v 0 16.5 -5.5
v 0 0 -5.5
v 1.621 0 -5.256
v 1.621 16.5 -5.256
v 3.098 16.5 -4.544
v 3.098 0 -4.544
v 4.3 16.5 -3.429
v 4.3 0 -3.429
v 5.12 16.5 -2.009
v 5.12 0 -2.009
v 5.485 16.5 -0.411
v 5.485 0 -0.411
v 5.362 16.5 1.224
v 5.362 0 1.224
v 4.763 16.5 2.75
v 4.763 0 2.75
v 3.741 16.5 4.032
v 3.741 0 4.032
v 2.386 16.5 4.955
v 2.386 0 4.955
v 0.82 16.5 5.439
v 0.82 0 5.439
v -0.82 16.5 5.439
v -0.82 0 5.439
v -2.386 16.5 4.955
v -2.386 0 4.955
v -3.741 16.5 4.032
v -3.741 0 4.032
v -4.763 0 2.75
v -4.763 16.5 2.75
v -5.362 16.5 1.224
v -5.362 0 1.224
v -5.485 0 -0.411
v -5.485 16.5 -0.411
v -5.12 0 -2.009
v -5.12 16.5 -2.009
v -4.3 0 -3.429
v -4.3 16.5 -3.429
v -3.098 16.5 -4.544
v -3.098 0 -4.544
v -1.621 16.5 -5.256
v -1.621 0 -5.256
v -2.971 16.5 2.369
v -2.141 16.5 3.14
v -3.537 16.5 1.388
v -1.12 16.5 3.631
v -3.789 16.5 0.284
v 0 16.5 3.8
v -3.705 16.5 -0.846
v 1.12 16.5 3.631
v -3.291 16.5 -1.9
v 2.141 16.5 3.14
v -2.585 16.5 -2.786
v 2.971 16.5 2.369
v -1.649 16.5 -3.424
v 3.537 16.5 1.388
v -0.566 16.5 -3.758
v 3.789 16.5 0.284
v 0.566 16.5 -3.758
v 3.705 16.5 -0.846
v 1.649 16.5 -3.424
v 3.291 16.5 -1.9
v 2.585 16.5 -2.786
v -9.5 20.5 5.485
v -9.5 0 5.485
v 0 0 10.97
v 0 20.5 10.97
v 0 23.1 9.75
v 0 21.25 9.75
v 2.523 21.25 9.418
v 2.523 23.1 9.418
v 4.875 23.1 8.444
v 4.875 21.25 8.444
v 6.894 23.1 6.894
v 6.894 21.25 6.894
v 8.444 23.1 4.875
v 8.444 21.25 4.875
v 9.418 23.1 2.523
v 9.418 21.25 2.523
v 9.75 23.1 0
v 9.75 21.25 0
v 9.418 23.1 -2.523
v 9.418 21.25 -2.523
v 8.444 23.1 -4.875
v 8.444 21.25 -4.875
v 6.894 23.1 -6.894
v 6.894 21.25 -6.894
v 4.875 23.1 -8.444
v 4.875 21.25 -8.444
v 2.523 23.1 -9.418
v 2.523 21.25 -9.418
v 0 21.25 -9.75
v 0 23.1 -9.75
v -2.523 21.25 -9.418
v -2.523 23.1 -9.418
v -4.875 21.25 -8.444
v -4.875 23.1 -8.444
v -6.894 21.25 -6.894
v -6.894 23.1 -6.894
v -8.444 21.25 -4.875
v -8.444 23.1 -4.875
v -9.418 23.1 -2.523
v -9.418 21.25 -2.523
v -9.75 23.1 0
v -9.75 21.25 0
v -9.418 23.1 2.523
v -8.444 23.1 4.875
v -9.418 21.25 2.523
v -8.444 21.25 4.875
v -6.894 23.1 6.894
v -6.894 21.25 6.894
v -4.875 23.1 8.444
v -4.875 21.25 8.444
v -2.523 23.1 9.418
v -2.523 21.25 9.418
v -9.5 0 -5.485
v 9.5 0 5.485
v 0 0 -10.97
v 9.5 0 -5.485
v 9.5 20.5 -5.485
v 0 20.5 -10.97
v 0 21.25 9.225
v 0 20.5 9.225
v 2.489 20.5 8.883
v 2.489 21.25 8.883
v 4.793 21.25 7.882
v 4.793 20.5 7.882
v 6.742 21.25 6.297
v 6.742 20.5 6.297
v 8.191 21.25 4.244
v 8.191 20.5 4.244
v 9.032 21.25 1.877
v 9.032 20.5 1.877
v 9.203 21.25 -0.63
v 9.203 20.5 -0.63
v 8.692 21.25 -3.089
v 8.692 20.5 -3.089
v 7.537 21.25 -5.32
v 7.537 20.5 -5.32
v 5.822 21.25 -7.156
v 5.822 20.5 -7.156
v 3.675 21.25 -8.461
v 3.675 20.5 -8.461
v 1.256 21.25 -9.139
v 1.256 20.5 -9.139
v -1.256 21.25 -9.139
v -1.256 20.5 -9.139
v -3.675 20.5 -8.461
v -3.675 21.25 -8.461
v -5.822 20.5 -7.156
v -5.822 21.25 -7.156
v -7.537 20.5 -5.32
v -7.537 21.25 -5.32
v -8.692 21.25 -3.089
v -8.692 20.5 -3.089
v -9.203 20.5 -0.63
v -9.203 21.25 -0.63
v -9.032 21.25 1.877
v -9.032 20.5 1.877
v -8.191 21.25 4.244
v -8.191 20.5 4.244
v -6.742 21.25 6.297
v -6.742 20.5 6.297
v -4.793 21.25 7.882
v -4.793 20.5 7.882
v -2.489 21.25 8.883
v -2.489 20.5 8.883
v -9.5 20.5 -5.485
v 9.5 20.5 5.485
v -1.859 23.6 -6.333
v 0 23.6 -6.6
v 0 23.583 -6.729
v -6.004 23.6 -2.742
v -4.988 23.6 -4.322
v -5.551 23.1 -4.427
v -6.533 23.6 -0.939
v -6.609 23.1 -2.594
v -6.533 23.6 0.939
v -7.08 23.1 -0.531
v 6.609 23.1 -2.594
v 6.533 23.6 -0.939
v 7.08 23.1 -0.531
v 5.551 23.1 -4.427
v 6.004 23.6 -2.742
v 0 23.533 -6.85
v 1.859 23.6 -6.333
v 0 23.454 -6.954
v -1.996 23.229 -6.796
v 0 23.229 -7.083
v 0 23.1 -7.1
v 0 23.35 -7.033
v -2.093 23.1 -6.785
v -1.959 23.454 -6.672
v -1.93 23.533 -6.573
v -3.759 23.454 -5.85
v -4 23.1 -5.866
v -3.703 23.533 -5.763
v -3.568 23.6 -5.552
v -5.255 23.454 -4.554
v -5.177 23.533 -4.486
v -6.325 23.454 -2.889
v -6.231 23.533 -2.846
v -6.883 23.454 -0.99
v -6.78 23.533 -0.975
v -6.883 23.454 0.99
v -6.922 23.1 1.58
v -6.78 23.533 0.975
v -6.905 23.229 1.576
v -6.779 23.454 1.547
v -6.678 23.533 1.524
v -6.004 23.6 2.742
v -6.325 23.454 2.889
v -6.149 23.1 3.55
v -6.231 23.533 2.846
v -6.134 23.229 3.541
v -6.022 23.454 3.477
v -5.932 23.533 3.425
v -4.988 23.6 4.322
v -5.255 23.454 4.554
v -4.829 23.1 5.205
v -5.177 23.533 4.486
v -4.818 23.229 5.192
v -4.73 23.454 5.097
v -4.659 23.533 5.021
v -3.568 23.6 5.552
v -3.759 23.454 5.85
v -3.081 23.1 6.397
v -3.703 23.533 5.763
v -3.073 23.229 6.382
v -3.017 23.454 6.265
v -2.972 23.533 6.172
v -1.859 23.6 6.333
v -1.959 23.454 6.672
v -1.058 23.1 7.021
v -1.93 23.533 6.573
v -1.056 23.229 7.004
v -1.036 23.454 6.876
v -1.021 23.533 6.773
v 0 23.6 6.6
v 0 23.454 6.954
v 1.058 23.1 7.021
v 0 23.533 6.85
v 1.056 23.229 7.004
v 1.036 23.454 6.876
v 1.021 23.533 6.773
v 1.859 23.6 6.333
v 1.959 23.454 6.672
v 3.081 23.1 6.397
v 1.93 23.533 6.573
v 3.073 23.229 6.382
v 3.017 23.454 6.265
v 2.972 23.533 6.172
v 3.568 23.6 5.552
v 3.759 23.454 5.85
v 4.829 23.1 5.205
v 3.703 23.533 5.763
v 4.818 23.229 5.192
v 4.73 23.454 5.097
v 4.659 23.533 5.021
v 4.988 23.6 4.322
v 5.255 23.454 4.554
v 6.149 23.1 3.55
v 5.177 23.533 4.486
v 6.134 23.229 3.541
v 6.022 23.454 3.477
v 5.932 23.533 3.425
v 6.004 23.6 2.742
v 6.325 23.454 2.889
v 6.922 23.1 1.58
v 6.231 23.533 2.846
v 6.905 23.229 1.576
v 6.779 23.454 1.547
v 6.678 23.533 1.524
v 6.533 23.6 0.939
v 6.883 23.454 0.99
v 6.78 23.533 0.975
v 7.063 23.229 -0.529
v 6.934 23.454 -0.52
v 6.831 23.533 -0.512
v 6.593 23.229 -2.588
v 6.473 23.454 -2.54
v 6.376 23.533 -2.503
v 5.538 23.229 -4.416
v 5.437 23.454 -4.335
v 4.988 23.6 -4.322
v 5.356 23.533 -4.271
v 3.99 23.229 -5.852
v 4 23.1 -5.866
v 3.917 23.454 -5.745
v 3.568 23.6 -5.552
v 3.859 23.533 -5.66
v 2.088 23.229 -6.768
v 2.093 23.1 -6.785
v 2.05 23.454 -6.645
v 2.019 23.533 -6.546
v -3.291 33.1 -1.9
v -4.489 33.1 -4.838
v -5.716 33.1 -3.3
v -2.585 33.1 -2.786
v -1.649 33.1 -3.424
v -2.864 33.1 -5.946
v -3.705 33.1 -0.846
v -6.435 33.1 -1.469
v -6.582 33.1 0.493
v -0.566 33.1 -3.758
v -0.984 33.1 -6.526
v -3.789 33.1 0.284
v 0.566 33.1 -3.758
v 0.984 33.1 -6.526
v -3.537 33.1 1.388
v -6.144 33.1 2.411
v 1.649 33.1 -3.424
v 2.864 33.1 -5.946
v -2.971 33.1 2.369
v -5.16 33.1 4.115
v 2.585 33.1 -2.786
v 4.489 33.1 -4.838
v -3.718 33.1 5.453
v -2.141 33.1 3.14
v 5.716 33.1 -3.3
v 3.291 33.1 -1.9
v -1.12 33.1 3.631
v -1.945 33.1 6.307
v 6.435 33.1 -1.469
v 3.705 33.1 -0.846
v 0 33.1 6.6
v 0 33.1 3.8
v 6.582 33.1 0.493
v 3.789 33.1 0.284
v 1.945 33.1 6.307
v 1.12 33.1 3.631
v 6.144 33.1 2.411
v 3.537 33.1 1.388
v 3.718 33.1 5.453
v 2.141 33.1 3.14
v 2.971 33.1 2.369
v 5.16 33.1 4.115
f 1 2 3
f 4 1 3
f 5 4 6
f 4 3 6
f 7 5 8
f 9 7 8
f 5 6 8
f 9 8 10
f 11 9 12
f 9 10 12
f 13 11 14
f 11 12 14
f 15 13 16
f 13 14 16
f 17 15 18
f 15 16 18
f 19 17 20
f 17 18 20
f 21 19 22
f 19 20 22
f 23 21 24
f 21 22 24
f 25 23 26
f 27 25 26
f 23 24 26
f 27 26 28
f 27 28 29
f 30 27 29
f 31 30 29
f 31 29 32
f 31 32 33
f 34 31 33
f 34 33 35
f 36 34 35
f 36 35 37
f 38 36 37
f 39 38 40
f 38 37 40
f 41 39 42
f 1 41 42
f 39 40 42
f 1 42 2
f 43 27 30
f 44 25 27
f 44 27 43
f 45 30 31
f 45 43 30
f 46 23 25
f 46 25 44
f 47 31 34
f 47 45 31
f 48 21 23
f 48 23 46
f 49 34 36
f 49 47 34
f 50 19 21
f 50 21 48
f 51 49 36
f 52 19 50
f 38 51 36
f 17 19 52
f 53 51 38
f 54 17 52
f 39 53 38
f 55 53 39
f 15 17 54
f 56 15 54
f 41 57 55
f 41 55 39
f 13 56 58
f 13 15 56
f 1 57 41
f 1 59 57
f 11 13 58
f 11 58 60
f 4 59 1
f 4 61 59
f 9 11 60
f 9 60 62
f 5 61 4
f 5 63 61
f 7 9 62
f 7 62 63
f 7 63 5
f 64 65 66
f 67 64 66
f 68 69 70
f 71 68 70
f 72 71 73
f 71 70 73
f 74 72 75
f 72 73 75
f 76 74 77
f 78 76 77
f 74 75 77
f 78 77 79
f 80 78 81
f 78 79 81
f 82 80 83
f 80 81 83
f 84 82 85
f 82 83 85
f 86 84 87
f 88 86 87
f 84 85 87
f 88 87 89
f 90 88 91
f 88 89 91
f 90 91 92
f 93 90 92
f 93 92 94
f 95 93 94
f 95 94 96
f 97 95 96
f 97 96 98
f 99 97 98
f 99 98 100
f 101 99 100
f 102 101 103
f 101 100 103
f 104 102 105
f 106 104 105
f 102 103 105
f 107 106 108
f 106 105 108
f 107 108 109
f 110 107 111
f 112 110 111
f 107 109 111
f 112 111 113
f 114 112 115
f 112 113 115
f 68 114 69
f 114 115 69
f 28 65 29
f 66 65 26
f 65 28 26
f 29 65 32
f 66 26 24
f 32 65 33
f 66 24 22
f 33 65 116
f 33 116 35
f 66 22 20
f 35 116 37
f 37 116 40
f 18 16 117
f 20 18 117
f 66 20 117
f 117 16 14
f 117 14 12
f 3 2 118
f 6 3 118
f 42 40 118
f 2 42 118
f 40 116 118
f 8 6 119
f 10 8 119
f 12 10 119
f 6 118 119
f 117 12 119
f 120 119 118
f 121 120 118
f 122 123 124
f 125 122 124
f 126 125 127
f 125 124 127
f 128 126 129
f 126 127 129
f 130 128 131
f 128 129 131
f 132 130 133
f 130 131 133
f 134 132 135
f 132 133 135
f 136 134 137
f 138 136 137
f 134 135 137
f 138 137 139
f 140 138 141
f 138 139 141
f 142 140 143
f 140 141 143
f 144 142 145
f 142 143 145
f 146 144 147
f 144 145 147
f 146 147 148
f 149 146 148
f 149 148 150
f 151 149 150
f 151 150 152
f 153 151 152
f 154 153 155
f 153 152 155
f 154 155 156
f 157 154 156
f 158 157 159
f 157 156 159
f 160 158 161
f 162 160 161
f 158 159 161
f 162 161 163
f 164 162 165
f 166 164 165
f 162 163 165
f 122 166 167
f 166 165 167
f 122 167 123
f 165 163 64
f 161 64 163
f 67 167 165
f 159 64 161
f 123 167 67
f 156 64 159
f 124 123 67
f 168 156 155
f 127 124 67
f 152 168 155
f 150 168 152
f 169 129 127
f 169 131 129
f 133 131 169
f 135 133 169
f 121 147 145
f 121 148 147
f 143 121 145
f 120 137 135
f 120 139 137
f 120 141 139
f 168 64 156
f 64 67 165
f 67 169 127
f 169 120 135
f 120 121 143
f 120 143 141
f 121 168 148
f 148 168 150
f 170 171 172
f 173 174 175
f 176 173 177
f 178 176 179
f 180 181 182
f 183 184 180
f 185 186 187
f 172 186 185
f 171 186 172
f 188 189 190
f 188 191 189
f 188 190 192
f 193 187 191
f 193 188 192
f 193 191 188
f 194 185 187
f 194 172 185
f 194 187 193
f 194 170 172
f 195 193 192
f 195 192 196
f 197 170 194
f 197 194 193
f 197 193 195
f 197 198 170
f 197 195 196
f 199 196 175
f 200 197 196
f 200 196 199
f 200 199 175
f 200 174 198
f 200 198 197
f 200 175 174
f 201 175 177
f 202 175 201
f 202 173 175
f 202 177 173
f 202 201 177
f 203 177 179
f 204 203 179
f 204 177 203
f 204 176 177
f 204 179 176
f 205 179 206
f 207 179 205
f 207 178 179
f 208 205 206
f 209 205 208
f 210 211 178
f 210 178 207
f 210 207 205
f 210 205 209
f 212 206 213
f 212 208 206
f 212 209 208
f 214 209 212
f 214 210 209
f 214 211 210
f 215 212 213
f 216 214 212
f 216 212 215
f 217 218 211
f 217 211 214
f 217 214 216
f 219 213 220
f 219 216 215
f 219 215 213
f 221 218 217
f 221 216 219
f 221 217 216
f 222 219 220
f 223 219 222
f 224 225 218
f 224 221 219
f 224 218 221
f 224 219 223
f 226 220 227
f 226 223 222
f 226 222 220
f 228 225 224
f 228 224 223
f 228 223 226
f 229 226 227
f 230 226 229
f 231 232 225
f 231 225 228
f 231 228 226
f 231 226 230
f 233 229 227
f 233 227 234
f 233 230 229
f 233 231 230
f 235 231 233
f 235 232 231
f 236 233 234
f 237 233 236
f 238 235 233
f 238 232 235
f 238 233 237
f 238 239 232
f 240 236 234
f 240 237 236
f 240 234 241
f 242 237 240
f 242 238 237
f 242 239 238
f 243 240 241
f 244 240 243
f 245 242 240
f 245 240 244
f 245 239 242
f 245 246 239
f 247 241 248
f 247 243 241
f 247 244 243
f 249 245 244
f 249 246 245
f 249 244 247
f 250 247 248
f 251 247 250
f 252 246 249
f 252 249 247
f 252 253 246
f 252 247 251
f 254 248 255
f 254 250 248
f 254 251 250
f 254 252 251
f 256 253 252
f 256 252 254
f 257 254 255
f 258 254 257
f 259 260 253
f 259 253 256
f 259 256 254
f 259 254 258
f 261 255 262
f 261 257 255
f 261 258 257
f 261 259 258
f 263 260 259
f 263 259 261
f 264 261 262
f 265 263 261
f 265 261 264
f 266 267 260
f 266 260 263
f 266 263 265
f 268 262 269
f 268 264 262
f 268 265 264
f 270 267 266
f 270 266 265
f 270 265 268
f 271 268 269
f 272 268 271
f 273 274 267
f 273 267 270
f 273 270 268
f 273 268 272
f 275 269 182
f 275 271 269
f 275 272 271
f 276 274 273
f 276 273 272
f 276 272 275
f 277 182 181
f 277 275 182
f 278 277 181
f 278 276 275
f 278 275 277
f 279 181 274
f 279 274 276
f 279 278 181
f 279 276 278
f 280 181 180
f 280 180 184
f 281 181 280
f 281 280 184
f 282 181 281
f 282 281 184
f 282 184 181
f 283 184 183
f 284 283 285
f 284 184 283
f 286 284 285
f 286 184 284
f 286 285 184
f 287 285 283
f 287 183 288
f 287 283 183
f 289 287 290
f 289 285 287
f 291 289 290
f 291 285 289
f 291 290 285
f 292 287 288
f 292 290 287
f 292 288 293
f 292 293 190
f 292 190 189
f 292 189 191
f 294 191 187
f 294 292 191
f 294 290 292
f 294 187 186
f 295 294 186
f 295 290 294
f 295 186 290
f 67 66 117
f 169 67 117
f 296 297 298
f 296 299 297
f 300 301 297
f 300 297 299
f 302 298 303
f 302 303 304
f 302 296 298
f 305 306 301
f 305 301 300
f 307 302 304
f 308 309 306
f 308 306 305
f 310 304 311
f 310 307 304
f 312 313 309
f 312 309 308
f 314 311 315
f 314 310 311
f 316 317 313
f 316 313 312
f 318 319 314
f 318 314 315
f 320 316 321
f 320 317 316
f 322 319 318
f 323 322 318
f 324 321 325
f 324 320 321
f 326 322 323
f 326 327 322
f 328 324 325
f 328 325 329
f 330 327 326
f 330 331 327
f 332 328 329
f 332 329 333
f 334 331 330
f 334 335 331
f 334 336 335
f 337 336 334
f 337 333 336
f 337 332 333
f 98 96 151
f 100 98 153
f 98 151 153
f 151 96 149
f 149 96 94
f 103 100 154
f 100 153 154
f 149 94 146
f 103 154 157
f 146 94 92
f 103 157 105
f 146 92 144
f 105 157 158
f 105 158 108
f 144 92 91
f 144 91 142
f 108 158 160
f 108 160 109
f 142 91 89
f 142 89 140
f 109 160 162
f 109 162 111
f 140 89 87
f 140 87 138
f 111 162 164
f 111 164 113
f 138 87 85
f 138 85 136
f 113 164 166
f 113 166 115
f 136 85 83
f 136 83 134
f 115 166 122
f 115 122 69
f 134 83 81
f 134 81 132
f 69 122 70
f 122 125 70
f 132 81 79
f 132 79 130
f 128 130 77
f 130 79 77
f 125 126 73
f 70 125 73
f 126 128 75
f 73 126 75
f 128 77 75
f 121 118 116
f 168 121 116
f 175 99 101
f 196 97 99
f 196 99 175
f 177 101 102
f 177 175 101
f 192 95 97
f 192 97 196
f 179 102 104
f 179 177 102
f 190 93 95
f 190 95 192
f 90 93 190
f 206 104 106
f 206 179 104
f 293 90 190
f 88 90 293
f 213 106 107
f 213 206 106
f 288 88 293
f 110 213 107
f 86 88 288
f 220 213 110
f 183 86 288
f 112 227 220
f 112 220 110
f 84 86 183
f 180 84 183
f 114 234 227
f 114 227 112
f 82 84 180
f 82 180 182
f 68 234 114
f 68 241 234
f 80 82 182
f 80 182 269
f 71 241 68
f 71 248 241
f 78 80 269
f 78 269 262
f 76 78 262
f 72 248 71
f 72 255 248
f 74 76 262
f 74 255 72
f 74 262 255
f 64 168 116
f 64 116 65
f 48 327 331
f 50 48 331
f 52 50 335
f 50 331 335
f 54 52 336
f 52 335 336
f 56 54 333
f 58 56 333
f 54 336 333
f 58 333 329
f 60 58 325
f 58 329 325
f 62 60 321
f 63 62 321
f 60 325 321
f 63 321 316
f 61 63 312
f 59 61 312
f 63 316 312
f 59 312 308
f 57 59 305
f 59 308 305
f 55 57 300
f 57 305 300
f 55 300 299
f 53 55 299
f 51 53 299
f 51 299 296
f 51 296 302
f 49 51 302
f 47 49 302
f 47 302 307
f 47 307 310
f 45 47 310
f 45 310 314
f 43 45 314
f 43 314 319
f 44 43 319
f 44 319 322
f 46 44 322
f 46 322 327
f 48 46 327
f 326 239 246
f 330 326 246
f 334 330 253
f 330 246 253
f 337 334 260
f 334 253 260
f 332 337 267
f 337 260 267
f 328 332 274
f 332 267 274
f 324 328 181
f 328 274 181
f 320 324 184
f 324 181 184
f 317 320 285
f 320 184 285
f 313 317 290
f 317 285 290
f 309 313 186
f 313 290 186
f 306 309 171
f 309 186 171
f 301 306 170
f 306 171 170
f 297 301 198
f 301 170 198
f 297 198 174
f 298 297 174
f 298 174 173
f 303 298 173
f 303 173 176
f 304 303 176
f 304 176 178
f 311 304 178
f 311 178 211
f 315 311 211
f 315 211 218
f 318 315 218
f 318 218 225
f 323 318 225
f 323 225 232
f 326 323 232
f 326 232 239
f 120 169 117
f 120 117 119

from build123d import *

# Parameters (mm, degrees)
BOSS_EXTRUDE1_DEPTH = 20.5
SKETCH2_R           = 9.225
BOSS_EXTRUDE2_DEPTH = 0.75
SKETCH3_R           = 9.75
BOSS_EXTRUDE3_DEPTH = 1.85
SKETCH4_R           = 6.6
BOSS_EXTRUDE4_DEPTH = 10
SKETCH5_R           = 3.8
CUT_EXTRUDE1_DEPTH  = 37.207814534
SKETCH6_R           = 5.5
CUT_EXTRUDE2_DEPTH  = 16.5


with BuildPart() as part:
    # Sketch1 → Boss-Extrude1 (new body)
    with BuildSketch(Plane(origin=(0, 0, 0), x_dir=(1, 0, 0), z_dir=(0, 1, 0))):
        Polygon((-9.5, 5.484827557), (-9.5, -5.484827557), (0, -10.969655115), (9.5, -5.484827557), (9.5, 5.484827557), (0, 10.969655115), align=None)
    extrude(amount=BOSS_EXTRUDE1_DEPTH)

    # Sketch2 → Boss-Extrude2 (add)
    with BuildSketch(Plane(origin=(0, 20.5, 0), x_dir=(1, 0, 0), z_dir=(0, 1, 0))):
        with Locations(Location((0, 0, 0), (0, 0, 270))):
            Circle(SKETCH2_R)
    extrude(amount=BOSS_EXTRUDE2_DEPTH)

    # Sketch3 → Boss-Extrude3 (add)
    with BuildSketch(Plane(origin=(0, 21.25, 0), x_dir=(1, 0, 0), z_dir=(0, 1, 0))):
        with Locations(Location((0, 0, 0), (0, 0, 270))):
            Circle(SKETCH3_R)
    extrude(amount=BOSS_EXTRUDE3_DEPTH)

    # Sketch4 → Boss-Extrude4 (add)
    with BuildSketch(Plane(origin=(0, 23.1, 0), x_dir=(1, 0, 0), z_dir=(0, 1, 0))):
        with Locations(Location((0, 0, 0), (0, 0, 270))):
            Circle(SKETCH4_R)
    extrude(amount=BOSS_EXTRUDE4_DEPTH)

    # Sketch5 → Cut-Extrude1 (cut, through all)
    with BuildSketch(Plane(origin=(0, 33.1, 0), x_dir=(1, 0, 0), z_dir=(0, 1, 0))):
        with Locations(Location((0, 0, 0), (0, 0, 270))):
            Circle(SKETCH5_R)
    extrude(amount=-CUT_EXTRUDE1_DEPTH, mode=Mode.SUBTRACT)

    # Sketch6 → Cut-Extrude2 (cut)
    with BuildSketch(Plane.XZ):
        with Locations(Location((0, 0, 0), (0, 0, 270))):
            Circle(SKETCH6_R)
    extrude(amount=-CUT_EXTRUDE2_DEPTH, mode=Mode.SUBTRACT)

    # Sketch7 → Revolve1 (revolve)
    with BuildSketch(Plane.XY, mode=Mode.PRIVATE) as revolve1_sk:
        with BuildLine():
            Line((-6.6, 23.6), (-6.6, 23.1))
            Line((-6.6, 23.1), (-7.1, 23.1))
            ThreePointArc((-7.1, 23.1), (-6.953553391, 23.453553391), (-6.6, 23.6))
        make_face()
    revolve(revolve1_sk.sketch.rotate(Axis((0, 0, 0), (0, 1, 0)), 270), axis=Axis((0, 0, 0), (0, 1, 0)))


solid = part.part
